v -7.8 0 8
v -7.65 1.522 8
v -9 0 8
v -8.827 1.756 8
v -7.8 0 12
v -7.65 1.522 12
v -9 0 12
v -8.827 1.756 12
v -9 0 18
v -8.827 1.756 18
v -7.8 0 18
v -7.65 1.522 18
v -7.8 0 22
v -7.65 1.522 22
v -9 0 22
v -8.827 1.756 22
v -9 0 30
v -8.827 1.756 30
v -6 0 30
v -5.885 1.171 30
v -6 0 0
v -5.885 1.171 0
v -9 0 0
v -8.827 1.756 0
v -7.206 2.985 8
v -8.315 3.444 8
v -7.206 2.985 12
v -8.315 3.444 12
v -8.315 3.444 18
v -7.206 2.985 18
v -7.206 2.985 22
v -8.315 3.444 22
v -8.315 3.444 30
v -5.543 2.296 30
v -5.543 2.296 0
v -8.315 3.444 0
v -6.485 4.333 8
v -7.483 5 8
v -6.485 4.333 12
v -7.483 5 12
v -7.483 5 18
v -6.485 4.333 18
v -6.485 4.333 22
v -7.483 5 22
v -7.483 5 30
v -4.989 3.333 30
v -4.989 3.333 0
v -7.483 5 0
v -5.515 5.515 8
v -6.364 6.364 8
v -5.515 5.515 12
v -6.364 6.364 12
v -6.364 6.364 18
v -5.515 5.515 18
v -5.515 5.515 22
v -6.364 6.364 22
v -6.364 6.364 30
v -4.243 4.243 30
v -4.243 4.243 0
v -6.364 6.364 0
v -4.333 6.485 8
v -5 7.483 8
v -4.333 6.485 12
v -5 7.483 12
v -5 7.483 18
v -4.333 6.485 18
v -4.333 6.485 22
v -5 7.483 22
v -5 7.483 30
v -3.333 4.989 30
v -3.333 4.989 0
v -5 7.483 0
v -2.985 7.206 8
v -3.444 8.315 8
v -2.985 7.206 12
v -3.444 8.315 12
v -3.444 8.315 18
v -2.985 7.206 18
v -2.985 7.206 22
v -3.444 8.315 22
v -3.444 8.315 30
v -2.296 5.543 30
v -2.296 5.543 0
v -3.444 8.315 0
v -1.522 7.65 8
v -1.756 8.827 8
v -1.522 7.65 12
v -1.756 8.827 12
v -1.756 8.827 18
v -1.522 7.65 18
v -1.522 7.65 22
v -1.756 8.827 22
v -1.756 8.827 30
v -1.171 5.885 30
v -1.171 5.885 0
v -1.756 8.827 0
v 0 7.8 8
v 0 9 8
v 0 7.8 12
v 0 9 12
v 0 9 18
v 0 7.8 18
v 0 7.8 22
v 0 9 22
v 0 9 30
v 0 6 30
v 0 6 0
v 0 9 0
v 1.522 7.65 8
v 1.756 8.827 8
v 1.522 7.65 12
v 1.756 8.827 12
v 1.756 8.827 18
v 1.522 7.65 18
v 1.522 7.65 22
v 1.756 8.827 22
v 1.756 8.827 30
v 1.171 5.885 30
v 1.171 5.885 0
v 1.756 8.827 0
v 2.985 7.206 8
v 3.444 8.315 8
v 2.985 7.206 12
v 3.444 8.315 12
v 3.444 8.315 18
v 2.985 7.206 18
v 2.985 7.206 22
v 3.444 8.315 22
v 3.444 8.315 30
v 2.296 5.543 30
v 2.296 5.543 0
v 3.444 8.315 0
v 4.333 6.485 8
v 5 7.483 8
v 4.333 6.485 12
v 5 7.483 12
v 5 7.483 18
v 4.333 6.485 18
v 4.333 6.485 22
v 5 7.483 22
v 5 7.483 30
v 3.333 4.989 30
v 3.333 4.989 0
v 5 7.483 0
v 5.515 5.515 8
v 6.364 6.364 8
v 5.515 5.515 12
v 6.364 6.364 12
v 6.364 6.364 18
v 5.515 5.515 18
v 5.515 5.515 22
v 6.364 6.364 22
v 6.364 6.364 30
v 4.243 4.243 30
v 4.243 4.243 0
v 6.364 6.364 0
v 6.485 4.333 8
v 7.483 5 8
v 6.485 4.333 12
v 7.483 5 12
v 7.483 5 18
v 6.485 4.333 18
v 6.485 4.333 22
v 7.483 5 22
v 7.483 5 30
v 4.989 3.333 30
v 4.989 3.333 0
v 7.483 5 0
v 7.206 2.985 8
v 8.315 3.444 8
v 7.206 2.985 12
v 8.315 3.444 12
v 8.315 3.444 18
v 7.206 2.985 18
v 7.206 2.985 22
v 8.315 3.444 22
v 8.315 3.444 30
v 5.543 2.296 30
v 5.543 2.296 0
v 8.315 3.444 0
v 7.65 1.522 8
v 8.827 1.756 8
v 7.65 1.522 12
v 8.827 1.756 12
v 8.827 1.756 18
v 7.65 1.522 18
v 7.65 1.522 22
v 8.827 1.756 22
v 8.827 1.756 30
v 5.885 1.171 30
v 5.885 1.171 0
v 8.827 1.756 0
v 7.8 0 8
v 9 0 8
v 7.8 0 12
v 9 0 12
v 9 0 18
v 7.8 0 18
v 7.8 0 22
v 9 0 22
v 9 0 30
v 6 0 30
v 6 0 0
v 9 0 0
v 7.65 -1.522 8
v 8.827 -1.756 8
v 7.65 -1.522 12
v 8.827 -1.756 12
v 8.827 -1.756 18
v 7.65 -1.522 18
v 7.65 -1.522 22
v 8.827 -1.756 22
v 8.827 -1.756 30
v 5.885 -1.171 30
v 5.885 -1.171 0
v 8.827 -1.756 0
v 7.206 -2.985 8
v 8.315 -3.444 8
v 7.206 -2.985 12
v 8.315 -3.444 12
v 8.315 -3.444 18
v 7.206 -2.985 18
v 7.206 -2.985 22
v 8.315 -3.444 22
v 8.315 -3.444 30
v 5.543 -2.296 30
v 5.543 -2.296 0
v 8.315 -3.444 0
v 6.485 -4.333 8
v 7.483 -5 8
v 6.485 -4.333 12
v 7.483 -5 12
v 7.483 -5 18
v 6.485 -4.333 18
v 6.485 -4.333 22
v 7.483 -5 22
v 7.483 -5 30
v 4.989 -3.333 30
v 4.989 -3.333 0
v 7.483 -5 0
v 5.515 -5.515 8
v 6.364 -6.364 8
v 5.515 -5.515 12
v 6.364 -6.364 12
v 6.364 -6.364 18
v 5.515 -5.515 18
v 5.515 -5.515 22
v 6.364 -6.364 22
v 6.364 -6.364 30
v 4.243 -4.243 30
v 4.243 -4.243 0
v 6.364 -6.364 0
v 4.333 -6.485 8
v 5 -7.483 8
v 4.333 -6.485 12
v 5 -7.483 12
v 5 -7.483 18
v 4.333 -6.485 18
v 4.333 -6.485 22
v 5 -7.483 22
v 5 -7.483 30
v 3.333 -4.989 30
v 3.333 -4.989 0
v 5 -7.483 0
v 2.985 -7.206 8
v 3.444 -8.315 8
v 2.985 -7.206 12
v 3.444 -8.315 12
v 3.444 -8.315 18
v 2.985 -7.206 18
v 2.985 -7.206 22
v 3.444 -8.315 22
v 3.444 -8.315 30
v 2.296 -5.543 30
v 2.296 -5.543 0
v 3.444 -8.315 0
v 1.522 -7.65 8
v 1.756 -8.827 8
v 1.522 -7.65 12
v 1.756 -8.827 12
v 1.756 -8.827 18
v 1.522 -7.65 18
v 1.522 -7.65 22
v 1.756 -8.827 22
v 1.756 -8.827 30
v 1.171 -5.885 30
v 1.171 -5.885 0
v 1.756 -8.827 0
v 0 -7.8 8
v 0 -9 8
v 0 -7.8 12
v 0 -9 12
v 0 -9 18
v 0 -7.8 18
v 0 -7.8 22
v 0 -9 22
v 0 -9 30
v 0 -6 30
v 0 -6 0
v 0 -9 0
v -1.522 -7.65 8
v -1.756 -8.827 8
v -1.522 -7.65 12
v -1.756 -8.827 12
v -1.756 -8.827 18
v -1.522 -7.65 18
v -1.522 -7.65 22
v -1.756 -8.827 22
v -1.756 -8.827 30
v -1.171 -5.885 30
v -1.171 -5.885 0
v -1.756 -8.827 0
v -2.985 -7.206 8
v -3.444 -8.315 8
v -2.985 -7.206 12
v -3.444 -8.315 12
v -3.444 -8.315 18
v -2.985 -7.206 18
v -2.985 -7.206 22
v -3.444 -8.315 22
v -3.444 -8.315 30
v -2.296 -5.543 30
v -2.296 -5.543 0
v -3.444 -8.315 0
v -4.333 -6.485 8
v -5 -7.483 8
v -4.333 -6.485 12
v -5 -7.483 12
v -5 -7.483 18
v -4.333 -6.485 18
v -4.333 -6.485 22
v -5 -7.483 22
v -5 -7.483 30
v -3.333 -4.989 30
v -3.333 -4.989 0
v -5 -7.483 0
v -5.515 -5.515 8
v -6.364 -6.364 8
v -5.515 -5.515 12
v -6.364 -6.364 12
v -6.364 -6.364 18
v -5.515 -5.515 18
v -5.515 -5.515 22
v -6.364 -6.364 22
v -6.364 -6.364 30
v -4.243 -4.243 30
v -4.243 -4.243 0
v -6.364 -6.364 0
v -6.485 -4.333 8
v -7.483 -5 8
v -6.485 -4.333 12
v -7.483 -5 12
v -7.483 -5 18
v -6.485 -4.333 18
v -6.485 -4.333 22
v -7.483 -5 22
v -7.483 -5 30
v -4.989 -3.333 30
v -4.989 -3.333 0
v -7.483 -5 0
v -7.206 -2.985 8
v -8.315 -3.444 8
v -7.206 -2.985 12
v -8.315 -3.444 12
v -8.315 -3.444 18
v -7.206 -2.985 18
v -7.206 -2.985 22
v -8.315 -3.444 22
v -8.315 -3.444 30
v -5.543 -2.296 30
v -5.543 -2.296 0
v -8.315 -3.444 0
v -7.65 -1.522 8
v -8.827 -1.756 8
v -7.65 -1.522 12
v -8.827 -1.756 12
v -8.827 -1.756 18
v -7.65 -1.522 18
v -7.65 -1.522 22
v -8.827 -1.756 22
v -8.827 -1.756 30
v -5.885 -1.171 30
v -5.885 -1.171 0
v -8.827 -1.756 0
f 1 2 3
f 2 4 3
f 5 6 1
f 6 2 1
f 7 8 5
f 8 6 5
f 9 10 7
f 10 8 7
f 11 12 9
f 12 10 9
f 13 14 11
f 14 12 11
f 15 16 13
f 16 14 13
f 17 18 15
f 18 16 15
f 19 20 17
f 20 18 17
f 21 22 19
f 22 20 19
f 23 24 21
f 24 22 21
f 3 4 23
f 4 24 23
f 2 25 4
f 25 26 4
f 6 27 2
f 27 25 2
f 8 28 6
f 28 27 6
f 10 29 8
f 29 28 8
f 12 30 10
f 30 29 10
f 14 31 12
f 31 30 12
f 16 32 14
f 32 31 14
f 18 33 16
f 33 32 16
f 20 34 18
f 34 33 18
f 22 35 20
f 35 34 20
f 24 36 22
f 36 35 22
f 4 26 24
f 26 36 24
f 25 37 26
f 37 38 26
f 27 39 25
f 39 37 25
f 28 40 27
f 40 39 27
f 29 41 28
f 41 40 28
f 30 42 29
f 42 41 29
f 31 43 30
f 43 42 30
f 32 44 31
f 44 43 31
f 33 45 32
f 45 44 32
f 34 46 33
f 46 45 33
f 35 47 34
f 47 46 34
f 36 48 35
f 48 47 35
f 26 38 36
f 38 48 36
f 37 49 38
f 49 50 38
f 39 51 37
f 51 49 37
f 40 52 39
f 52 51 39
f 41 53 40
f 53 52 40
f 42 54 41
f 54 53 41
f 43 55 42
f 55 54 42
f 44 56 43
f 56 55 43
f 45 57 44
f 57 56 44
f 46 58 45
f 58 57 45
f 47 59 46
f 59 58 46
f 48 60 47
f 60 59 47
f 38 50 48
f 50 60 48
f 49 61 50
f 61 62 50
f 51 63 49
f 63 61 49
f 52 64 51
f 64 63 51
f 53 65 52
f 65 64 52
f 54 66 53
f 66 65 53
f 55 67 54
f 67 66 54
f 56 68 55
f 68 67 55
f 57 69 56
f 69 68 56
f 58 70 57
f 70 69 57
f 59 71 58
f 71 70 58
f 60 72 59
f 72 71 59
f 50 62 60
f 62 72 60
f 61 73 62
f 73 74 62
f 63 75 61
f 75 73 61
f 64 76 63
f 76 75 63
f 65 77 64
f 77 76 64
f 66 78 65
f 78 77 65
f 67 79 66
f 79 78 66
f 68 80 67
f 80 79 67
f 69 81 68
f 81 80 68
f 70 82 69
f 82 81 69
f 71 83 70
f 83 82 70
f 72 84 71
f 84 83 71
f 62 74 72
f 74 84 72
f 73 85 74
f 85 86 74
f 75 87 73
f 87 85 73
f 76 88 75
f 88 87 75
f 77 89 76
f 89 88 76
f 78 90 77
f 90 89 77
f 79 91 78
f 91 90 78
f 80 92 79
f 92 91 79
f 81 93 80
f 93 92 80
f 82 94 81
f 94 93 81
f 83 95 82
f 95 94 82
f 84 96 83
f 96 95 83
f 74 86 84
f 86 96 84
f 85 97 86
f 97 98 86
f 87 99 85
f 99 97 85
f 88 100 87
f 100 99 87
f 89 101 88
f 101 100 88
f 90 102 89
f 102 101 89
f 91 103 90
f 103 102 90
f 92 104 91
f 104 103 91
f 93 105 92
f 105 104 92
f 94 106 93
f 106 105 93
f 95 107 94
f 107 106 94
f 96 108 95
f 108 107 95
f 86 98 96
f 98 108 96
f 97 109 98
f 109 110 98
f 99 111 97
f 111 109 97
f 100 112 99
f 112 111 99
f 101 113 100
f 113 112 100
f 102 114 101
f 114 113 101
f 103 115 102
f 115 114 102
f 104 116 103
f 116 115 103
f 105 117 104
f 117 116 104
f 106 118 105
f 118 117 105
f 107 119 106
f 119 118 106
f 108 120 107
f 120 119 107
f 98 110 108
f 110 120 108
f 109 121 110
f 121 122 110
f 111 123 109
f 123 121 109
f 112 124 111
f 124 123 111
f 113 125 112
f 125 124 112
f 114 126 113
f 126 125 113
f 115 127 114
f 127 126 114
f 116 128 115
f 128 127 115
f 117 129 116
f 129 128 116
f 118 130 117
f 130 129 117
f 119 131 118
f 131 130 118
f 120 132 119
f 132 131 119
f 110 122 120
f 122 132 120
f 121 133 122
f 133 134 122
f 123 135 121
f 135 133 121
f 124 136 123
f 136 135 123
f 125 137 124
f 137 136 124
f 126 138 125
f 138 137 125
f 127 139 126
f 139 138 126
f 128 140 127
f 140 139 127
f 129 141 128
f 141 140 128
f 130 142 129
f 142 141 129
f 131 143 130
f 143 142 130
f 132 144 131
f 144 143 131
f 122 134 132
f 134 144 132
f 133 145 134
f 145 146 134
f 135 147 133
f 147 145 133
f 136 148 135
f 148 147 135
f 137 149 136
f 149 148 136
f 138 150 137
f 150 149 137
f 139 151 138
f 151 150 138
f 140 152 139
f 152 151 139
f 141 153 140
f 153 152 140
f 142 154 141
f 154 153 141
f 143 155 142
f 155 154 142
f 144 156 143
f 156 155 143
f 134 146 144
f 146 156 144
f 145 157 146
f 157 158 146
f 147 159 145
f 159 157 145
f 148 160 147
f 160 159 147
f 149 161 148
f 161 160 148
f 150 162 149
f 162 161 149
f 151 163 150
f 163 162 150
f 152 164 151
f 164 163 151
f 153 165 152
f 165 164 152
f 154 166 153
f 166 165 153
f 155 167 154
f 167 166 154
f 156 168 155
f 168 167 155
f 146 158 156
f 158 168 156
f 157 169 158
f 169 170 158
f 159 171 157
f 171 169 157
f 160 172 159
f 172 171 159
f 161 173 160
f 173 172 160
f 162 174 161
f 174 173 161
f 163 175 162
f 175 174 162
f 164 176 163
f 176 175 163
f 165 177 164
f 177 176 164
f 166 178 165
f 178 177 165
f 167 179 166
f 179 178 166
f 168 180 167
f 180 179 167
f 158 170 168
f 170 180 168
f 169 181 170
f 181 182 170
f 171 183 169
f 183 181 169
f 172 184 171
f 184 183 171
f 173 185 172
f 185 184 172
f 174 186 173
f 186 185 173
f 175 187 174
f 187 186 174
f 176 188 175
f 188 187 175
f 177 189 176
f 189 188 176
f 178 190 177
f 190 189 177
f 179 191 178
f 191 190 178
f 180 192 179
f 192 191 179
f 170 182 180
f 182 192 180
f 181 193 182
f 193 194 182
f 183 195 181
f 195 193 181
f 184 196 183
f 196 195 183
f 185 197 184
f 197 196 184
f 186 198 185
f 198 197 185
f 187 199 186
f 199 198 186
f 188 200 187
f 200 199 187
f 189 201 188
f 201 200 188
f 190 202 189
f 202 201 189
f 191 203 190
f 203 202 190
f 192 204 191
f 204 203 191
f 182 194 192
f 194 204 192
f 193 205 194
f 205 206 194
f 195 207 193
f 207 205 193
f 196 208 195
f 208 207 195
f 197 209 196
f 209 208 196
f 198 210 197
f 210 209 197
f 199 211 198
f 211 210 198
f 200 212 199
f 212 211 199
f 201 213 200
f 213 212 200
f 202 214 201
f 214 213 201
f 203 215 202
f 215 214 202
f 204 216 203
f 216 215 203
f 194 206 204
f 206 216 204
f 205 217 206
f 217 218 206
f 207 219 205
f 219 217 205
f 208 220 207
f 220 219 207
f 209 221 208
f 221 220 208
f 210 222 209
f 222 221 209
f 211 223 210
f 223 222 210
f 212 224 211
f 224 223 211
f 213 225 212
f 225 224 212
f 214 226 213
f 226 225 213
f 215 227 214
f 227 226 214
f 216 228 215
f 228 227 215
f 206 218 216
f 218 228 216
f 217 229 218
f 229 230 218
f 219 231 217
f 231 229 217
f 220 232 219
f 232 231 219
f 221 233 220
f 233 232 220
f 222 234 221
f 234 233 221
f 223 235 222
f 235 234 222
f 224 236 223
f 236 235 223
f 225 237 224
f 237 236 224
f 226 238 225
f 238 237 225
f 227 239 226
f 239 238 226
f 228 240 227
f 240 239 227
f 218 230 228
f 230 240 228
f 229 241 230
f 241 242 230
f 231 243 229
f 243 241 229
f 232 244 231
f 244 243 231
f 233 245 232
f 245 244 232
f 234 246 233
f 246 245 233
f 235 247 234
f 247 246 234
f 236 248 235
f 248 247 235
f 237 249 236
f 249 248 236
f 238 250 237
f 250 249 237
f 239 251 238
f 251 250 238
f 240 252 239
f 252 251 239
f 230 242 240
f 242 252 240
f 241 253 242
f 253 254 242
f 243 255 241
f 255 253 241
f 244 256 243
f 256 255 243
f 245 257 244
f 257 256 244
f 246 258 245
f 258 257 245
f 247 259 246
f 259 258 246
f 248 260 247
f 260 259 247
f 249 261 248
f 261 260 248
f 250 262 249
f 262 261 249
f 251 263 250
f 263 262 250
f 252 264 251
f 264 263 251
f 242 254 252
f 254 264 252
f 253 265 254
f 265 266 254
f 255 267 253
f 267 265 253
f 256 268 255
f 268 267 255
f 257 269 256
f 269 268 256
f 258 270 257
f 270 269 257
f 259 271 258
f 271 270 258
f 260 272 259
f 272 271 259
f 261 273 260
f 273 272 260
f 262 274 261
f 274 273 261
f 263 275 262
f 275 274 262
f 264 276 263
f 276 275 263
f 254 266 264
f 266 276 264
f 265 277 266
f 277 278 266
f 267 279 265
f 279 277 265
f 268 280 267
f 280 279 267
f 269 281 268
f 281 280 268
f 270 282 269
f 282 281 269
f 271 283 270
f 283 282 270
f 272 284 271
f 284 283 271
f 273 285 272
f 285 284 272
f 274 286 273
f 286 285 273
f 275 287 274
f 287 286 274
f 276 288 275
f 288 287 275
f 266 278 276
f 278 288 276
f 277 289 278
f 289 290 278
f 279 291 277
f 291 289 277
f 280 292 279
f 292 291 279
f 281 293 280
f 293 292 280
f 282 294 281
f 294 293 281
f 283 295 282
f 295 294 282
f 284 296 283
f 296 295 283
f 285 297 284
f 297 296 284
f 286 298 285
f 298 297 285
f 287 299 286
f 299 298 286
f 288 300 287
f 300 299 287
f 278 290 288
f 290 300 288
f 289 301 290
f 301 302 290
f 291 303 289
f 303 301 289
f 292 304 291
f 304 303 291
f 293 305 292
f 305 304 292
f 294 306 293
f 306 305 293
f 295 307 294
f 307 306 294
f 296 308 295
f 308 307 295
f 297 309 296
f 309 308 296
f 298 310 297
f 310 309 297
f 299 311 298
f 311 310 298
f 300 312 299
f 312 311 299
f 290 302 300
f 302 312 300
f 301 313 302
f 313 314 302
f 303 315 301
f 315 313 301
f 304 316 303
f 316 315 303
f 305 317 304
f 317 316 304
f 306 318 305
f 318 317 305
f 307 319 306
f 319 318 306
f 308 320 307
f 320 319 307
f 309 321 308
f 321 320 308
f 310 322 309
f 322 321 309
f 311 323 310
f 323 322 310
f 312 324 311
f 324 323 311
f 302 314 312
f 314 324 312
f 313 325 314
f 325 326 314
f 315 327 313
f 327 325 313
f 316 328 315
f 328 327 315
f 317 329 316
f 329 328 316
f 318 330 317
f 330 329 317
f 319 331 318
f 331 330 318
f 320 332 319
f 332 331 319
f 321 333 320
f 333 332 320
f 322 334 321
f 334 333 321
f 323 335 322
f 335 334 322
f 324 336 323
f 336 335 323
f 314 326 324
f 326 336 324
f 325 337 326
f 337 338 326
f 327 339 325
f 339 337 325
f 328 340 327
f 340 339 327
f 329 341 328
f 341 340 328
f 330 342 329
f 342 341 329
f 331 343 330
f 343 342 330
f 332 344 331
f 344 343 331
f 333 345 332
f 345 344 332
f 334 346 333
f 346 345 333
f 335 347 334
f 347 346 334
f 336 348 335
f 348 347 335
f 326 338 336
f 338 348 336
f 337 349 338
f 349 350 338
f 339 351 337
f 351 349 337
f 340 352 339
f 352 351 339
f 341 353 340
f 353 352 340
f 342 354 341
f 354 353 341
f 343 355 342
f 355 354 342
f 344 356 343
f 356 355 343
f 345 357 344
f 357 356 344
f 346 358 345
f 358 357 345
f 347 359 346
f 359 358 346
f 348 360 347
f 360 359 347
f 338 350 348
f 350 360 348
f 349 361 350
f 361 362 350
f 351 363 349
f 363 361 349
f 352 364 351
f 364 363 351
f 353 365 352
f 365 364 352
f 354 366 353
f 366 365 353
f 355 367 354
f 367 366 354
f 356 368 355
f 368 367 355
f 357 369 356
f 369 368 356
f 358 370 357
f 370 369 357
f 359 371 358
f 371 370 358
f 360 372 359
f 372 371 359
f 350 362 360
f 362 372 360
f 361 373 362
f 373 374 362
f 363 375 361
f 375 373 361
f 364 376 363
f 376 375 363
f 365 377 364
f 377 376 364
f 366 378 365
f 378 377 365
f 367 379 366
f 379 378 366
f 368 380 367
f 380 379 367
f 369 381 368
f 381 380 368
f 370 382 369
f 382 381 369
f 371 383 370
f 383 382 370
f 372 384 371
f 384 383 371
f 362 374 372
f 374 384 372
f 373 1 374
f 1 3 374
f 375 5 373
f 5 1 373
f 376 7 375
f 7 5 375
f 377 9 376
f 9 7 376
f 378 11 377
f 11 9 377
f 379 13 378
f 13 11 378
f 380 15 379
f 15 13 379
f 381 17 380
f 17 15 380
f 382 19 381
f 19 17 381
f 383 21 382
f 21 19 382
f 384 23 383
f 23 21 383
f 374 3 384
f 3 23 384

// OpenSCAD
$fn = 32;

// ----------------------------------------------------------------------
// Grooved revolve: stepped, bore R6
// ----------------------------------------------------------------------

// --- parameters (mm) ---
bore_r = 6;               // bore radius
outer_r = 9;              // outer radius of the body
total_h = 30;             // overall height, Z
wall = 3;                 // radial wall thickness
groove_w = 4;             // groove width
groove_d = 1.2;           // groove depth
grooves = 2;              // number of outer grooves

bbox_x = 2 * outer_r;  // full diameter
bore_d = 2 * bore_r;  // bore diameter
body_d = 2 * outer_r;  // body diameter
revolve_angle = 360;  // full turn around the Z axis

profile = [[6, 0], [9, 0], [9, 8], [7.8, 8], [7.8, 12], [9, 12], [9, 18], [7.8, 18], [7.8, 22], [9, 22], [9, 30], [6, 30]];  // primary outline, 12 points, counter clockwise

// --- the one profile operation ---
rotate_extrude(angle = revolve_angle) polygon(points = profile);
